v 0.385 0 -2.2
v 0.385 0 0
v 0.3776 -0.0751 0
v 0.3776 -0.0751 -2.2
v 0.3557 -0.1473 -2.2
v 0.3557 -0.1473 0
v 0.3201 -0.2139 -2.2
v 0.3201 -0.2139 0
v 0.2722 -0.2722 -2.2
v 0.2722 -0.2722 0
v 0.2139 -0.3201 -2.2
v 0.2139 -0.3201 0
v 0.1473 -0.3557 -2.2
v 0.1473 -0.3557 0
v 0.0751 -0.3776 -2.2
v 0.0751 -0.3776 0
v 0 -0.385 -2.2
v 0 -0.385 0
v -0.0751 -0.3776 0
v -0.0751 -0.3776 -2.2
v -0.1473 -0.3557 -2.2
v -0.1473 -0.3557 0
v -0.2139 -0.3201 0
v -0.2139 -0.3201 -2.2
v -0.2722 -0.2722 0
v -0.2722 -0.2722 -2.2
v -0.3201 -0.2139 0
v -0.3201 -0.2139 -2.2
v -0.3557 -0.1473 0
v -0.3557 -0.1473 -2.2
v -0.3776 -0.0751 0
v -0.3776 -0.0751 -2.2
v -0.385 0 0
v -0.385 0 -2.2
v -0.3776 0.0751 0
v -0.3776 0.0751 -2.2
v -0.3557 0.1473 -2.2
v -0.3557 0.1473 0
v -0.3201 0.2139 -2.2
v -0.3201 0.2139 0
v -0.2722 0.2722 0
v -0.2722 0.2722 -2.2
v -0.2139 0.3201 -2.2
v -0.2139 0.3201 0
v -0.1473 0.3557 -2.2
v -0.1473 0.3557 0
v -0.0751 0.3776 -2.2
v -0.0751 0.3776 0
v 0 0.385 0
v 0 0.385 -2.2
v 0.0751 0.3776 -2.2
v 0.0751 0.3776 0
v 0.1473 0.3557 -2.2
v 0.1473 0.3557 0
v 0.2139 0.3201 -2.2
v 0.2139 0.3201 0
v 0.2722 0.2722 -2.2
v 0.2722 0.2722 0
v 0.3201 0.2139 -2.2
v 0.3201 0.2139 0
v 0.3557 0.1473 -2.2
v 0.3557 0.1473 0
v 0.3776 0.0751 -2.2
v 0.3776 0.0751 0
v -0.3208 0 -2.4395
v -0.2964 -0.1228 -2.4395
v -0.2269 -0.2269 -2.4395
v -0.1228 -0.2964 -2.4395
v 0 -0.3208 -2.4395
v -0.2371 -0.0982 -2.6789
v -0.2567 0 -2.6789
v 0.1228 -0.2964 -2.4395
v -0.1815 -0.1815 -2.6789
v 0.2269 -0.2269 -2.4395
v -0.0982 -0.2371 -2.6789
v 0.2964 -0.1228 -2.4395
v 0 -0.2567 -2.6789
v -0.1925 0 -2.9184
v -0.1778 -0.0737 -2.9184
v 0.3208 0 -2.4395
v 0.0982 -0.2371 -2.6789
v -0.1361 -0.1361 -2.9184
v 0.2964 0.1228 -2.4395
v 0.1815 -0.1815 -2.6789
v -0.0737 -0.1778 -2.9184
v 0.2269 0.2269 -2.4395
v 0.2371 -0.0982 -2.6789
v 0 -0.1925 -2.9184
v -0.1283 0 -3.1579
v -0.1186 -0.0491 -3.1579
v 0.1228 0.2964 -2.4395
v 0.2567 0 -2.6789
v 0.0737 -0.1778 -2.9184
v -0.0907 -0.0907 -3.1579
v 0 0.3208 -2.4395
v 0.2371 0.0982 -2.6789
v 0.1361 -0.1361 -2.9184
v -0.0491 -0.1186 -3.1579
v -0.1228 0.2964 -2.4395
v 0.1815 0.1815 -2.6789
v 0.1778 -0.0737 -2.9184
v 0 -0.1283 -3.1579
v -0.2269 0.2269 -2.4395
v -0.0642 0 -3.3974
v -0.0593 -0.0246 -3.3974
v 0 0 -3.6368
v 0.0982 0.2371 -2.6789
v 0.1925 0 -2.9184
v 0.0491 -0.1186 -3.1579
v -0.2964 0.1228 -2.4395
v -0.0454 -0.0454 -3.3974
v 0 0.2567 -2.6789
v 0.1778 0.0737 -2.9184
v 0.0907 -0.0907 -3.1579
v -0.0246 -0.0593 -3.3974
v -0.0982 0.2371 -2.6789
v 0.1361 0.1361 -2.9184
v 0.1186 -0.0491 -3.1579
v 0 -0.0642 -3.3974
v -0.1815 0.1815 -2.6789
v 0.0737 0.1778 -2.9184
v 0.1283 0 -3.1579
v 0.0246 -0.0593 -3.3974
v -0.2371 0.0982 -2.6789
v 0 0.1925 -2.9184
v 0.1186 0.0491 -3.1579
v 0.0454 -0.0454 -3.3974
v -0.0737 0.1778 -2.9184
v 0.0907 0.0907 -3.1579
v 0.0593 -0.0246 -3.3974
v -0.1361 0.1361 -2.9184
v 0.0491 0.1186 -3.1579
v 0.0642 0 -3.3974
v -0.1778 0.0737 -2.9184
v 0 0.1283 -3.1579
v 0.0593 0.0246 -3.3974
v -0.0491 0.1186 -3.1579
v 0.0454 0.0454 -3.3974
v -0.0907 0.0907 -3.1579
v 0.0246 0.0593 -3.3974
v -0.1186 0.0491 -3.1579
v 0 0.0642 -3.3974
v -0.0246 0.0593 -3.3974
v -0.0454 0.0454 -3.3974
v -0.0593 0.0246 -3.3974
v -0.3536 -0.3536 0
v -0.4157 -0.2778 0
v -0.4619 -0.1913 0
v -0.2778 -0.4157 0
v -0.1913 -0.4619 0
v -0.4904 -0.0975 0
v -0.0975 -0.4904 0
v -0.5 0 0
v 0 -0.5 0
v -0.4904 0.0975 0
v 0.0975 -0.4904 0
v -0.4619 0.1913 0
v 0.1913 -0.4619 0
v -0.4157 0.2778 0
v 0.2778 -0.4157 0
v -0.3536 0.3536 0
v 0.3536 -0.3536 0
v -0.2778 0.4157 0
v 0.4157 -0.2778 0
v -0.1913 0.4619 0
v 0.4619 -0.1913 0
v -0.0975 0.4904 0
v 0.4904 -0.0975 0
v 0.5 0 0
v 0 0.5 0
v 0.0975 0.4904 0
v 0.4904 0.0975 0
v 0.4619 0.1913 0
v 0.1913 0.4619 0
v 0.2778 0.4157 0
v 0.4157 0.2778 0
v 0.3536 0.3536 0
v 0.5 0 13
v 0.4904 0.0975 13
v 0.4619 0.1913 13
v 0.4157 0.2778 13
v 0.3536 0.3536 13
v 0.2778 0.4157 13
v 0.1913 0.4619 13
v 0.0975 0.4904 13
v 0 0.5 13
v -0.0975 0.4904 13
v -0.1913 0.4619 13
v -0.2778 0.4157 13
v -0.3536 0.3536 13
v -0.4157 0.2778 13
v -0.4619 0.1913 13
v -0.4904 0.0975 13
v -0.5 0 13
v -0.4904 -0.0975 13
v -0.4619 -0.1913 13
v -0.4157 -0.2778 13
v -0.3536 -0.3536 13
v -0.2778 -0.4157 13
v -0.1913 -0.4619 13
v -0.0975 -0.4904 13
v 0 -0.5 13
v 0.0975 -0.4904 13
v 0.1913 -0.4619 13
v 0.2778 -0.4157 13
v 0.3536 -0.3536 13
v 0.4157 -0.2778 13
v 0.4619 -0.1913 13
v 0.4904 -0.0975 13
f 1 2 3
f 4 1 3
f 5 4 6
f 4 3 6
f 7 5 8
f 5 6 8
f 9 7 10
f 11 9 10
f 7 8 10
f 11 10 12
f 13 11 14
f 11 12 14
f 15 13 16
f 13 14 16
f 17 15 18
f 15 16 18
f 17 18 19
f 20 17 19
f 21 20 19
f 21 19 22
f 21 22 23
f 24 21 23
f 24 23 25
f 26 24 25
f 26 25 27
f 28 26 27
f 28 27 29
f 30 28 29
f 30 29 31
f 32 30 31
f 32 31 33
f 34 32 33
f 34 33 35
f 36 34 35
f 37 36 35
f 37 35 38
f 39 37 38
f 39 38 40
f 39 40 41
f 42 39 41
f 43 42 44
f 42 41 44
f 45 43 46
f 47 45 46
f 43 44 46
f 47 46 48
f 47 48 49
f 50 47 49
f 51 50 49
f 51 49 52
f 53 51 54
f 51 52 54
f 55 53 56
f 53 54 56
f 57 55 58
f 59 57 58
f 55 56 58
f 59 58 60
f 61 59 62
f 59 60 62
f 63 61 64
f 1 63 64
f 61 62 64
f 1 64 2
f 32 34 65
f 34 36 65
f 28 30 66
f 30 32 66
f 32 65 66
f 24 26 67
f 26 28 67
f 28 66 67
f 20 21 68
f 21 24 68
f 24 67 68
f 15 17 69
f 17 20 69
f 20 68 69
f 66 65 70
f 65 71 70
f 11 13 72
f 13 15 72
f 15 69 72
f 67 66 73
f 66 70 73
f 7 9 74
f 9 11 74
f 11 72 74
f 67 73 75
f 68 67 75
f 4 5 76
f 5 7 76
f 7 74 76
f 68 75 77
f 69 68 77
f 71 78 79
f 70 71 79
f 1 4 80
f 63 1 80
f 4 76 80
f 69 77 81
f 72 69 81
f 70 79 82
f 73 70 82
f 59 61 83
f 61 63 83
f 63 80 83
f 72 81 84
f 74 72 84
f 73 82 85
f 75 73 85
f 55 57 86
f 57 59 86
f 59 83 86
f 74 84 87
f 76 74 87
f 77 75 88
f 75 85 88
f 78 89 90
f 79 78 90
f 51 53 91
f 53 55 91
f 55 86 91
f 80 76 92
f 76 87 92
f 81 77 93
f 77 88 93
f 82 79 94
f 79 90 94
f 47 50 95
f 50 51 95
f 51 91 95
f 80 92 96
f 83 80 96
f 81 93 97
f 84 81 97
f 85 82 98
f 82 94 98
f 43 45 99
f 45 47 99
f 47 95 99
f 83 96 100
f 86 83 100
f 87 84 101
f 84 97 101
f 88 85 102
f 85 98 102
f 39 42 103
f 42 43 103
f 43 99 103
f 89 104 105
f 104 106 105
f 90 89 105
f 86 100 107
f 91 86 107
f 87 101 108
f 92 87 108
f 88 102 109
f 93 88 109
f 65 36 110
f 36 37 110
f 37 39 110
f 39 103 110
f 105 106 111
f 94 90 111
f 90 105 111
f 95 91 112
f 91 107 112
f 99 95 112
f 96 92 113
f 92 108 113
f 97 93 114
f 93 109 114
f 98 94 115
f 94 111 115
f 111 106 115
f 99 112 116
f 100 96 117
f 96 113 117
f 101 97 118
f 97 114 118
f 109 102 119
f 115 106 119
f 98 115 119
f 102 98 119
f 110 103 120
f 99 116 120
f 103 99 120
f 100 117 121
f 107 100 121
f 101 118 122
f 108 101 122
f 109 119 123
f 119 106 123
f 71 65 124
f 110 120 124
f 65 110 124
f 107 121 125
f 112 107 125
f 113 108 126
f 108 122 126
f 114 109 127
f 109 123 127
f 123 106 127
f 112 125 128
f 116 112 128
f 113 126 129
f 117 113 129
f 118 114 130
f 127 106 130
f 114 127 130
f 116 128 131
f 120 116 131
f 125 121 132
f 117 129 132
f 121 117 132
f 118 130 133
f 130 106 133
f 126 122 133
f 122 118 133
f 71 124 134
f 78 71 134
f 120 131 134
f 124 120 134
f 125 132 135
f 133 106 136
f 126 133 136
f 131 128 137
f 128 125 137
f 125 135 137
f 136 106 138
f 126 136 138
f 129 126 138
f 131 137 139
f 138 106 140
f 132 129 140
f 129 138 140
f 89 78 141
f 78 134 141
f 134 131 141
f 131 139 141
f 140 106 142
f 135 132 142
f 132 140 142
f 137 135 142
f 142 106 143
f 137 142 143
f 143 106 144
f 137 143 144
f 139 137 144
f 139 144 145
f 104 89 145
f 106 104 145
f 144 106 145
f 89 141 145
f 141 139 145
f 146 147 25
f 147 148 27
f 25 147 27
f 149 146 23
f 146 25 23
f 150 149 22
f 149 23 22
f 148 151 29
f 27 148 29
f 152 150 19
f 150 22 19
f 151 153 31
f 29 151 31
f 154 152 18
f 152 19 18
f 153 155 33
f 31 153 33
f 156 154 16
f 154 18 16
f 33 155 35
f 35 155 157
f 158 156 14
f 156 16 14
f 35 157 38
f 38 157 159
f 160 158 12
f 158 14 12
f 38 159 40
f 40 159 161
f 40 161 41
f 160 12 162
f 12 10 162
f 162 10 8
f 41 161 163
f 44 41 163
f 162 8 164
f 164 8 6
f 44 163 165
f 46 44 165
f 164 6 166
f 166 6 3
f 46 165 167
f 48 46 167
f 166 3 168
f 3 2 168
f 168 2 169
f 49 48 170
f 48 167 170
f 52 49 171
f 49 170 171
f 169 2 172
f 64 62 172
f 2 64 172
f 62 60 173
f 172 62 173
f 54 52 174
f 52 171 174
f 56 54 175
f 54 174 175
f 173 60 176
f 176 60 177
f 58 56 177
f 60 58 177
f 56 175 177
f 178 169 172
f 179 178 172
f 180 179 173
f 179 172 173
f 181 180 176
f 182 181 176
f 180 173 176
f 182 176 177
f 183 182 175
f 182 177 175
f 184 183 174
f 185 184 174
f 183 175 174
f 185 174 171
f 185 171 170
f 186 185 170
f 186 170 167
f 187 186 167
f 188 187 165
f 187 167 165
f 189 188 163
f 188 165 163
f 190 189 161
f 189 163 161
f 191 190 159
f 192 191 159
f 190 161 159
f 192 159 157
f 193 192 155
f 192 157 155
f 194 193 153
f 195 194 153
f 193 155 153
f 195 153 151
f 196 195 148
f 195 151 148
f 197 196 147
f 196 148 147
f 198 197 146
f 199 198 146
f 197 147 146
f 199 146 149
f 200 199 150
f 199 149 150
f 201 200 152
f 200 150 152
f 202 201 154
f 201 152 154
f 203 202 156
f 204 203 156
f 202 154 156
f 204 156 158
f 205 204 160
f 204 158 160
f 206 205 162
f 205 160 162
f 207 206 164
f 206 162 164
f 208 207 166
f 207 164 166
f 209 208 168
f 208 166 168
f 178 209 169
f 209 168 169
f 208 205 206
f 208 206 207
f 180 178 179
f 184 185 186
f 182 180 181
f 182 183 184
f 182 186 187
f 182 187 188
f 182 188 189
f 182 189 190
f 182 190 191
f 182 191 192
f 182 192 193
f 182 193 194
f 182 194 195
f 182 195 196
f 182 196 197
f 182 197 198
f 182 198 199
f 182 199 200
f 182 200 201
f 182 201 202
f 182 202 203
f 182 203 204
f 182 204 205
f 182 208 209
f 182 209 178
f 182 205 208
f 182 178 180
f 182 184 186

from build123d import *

# Parameters (mm, degrees)
F0_R     = 0.5
F1_DEPTH = 13
F2_R     = 0.385
F3_DEPTH = 2.2


with BuildPart() as f1:
    # F0 (on Top) → F1 (new body)
    with BuildSketch(Plane.XY):
        Circle(F0_R)
    extrude(amount=F1_DEPTH)

    # F2 (on face) → F3 (join)
    with BuildSketch(Plane(origin=(0, 0, 0), x_dir=(1, 0, 0), z_dir=(0, 0, -1))):
        Circle(F2_R)
    extrude(amount=F3_DEPTH)

    # F4 (on Front) → F5 (revolve)
    with BuildSketch(Plane.XZ):
        Polygon((-0.385, -2.2), (0, -3.63684), (0, -2.2), align=None)
    revolve(axis=Axis((0, 0, -2.91842), (0, 0, 1)))


solid = f1.part
